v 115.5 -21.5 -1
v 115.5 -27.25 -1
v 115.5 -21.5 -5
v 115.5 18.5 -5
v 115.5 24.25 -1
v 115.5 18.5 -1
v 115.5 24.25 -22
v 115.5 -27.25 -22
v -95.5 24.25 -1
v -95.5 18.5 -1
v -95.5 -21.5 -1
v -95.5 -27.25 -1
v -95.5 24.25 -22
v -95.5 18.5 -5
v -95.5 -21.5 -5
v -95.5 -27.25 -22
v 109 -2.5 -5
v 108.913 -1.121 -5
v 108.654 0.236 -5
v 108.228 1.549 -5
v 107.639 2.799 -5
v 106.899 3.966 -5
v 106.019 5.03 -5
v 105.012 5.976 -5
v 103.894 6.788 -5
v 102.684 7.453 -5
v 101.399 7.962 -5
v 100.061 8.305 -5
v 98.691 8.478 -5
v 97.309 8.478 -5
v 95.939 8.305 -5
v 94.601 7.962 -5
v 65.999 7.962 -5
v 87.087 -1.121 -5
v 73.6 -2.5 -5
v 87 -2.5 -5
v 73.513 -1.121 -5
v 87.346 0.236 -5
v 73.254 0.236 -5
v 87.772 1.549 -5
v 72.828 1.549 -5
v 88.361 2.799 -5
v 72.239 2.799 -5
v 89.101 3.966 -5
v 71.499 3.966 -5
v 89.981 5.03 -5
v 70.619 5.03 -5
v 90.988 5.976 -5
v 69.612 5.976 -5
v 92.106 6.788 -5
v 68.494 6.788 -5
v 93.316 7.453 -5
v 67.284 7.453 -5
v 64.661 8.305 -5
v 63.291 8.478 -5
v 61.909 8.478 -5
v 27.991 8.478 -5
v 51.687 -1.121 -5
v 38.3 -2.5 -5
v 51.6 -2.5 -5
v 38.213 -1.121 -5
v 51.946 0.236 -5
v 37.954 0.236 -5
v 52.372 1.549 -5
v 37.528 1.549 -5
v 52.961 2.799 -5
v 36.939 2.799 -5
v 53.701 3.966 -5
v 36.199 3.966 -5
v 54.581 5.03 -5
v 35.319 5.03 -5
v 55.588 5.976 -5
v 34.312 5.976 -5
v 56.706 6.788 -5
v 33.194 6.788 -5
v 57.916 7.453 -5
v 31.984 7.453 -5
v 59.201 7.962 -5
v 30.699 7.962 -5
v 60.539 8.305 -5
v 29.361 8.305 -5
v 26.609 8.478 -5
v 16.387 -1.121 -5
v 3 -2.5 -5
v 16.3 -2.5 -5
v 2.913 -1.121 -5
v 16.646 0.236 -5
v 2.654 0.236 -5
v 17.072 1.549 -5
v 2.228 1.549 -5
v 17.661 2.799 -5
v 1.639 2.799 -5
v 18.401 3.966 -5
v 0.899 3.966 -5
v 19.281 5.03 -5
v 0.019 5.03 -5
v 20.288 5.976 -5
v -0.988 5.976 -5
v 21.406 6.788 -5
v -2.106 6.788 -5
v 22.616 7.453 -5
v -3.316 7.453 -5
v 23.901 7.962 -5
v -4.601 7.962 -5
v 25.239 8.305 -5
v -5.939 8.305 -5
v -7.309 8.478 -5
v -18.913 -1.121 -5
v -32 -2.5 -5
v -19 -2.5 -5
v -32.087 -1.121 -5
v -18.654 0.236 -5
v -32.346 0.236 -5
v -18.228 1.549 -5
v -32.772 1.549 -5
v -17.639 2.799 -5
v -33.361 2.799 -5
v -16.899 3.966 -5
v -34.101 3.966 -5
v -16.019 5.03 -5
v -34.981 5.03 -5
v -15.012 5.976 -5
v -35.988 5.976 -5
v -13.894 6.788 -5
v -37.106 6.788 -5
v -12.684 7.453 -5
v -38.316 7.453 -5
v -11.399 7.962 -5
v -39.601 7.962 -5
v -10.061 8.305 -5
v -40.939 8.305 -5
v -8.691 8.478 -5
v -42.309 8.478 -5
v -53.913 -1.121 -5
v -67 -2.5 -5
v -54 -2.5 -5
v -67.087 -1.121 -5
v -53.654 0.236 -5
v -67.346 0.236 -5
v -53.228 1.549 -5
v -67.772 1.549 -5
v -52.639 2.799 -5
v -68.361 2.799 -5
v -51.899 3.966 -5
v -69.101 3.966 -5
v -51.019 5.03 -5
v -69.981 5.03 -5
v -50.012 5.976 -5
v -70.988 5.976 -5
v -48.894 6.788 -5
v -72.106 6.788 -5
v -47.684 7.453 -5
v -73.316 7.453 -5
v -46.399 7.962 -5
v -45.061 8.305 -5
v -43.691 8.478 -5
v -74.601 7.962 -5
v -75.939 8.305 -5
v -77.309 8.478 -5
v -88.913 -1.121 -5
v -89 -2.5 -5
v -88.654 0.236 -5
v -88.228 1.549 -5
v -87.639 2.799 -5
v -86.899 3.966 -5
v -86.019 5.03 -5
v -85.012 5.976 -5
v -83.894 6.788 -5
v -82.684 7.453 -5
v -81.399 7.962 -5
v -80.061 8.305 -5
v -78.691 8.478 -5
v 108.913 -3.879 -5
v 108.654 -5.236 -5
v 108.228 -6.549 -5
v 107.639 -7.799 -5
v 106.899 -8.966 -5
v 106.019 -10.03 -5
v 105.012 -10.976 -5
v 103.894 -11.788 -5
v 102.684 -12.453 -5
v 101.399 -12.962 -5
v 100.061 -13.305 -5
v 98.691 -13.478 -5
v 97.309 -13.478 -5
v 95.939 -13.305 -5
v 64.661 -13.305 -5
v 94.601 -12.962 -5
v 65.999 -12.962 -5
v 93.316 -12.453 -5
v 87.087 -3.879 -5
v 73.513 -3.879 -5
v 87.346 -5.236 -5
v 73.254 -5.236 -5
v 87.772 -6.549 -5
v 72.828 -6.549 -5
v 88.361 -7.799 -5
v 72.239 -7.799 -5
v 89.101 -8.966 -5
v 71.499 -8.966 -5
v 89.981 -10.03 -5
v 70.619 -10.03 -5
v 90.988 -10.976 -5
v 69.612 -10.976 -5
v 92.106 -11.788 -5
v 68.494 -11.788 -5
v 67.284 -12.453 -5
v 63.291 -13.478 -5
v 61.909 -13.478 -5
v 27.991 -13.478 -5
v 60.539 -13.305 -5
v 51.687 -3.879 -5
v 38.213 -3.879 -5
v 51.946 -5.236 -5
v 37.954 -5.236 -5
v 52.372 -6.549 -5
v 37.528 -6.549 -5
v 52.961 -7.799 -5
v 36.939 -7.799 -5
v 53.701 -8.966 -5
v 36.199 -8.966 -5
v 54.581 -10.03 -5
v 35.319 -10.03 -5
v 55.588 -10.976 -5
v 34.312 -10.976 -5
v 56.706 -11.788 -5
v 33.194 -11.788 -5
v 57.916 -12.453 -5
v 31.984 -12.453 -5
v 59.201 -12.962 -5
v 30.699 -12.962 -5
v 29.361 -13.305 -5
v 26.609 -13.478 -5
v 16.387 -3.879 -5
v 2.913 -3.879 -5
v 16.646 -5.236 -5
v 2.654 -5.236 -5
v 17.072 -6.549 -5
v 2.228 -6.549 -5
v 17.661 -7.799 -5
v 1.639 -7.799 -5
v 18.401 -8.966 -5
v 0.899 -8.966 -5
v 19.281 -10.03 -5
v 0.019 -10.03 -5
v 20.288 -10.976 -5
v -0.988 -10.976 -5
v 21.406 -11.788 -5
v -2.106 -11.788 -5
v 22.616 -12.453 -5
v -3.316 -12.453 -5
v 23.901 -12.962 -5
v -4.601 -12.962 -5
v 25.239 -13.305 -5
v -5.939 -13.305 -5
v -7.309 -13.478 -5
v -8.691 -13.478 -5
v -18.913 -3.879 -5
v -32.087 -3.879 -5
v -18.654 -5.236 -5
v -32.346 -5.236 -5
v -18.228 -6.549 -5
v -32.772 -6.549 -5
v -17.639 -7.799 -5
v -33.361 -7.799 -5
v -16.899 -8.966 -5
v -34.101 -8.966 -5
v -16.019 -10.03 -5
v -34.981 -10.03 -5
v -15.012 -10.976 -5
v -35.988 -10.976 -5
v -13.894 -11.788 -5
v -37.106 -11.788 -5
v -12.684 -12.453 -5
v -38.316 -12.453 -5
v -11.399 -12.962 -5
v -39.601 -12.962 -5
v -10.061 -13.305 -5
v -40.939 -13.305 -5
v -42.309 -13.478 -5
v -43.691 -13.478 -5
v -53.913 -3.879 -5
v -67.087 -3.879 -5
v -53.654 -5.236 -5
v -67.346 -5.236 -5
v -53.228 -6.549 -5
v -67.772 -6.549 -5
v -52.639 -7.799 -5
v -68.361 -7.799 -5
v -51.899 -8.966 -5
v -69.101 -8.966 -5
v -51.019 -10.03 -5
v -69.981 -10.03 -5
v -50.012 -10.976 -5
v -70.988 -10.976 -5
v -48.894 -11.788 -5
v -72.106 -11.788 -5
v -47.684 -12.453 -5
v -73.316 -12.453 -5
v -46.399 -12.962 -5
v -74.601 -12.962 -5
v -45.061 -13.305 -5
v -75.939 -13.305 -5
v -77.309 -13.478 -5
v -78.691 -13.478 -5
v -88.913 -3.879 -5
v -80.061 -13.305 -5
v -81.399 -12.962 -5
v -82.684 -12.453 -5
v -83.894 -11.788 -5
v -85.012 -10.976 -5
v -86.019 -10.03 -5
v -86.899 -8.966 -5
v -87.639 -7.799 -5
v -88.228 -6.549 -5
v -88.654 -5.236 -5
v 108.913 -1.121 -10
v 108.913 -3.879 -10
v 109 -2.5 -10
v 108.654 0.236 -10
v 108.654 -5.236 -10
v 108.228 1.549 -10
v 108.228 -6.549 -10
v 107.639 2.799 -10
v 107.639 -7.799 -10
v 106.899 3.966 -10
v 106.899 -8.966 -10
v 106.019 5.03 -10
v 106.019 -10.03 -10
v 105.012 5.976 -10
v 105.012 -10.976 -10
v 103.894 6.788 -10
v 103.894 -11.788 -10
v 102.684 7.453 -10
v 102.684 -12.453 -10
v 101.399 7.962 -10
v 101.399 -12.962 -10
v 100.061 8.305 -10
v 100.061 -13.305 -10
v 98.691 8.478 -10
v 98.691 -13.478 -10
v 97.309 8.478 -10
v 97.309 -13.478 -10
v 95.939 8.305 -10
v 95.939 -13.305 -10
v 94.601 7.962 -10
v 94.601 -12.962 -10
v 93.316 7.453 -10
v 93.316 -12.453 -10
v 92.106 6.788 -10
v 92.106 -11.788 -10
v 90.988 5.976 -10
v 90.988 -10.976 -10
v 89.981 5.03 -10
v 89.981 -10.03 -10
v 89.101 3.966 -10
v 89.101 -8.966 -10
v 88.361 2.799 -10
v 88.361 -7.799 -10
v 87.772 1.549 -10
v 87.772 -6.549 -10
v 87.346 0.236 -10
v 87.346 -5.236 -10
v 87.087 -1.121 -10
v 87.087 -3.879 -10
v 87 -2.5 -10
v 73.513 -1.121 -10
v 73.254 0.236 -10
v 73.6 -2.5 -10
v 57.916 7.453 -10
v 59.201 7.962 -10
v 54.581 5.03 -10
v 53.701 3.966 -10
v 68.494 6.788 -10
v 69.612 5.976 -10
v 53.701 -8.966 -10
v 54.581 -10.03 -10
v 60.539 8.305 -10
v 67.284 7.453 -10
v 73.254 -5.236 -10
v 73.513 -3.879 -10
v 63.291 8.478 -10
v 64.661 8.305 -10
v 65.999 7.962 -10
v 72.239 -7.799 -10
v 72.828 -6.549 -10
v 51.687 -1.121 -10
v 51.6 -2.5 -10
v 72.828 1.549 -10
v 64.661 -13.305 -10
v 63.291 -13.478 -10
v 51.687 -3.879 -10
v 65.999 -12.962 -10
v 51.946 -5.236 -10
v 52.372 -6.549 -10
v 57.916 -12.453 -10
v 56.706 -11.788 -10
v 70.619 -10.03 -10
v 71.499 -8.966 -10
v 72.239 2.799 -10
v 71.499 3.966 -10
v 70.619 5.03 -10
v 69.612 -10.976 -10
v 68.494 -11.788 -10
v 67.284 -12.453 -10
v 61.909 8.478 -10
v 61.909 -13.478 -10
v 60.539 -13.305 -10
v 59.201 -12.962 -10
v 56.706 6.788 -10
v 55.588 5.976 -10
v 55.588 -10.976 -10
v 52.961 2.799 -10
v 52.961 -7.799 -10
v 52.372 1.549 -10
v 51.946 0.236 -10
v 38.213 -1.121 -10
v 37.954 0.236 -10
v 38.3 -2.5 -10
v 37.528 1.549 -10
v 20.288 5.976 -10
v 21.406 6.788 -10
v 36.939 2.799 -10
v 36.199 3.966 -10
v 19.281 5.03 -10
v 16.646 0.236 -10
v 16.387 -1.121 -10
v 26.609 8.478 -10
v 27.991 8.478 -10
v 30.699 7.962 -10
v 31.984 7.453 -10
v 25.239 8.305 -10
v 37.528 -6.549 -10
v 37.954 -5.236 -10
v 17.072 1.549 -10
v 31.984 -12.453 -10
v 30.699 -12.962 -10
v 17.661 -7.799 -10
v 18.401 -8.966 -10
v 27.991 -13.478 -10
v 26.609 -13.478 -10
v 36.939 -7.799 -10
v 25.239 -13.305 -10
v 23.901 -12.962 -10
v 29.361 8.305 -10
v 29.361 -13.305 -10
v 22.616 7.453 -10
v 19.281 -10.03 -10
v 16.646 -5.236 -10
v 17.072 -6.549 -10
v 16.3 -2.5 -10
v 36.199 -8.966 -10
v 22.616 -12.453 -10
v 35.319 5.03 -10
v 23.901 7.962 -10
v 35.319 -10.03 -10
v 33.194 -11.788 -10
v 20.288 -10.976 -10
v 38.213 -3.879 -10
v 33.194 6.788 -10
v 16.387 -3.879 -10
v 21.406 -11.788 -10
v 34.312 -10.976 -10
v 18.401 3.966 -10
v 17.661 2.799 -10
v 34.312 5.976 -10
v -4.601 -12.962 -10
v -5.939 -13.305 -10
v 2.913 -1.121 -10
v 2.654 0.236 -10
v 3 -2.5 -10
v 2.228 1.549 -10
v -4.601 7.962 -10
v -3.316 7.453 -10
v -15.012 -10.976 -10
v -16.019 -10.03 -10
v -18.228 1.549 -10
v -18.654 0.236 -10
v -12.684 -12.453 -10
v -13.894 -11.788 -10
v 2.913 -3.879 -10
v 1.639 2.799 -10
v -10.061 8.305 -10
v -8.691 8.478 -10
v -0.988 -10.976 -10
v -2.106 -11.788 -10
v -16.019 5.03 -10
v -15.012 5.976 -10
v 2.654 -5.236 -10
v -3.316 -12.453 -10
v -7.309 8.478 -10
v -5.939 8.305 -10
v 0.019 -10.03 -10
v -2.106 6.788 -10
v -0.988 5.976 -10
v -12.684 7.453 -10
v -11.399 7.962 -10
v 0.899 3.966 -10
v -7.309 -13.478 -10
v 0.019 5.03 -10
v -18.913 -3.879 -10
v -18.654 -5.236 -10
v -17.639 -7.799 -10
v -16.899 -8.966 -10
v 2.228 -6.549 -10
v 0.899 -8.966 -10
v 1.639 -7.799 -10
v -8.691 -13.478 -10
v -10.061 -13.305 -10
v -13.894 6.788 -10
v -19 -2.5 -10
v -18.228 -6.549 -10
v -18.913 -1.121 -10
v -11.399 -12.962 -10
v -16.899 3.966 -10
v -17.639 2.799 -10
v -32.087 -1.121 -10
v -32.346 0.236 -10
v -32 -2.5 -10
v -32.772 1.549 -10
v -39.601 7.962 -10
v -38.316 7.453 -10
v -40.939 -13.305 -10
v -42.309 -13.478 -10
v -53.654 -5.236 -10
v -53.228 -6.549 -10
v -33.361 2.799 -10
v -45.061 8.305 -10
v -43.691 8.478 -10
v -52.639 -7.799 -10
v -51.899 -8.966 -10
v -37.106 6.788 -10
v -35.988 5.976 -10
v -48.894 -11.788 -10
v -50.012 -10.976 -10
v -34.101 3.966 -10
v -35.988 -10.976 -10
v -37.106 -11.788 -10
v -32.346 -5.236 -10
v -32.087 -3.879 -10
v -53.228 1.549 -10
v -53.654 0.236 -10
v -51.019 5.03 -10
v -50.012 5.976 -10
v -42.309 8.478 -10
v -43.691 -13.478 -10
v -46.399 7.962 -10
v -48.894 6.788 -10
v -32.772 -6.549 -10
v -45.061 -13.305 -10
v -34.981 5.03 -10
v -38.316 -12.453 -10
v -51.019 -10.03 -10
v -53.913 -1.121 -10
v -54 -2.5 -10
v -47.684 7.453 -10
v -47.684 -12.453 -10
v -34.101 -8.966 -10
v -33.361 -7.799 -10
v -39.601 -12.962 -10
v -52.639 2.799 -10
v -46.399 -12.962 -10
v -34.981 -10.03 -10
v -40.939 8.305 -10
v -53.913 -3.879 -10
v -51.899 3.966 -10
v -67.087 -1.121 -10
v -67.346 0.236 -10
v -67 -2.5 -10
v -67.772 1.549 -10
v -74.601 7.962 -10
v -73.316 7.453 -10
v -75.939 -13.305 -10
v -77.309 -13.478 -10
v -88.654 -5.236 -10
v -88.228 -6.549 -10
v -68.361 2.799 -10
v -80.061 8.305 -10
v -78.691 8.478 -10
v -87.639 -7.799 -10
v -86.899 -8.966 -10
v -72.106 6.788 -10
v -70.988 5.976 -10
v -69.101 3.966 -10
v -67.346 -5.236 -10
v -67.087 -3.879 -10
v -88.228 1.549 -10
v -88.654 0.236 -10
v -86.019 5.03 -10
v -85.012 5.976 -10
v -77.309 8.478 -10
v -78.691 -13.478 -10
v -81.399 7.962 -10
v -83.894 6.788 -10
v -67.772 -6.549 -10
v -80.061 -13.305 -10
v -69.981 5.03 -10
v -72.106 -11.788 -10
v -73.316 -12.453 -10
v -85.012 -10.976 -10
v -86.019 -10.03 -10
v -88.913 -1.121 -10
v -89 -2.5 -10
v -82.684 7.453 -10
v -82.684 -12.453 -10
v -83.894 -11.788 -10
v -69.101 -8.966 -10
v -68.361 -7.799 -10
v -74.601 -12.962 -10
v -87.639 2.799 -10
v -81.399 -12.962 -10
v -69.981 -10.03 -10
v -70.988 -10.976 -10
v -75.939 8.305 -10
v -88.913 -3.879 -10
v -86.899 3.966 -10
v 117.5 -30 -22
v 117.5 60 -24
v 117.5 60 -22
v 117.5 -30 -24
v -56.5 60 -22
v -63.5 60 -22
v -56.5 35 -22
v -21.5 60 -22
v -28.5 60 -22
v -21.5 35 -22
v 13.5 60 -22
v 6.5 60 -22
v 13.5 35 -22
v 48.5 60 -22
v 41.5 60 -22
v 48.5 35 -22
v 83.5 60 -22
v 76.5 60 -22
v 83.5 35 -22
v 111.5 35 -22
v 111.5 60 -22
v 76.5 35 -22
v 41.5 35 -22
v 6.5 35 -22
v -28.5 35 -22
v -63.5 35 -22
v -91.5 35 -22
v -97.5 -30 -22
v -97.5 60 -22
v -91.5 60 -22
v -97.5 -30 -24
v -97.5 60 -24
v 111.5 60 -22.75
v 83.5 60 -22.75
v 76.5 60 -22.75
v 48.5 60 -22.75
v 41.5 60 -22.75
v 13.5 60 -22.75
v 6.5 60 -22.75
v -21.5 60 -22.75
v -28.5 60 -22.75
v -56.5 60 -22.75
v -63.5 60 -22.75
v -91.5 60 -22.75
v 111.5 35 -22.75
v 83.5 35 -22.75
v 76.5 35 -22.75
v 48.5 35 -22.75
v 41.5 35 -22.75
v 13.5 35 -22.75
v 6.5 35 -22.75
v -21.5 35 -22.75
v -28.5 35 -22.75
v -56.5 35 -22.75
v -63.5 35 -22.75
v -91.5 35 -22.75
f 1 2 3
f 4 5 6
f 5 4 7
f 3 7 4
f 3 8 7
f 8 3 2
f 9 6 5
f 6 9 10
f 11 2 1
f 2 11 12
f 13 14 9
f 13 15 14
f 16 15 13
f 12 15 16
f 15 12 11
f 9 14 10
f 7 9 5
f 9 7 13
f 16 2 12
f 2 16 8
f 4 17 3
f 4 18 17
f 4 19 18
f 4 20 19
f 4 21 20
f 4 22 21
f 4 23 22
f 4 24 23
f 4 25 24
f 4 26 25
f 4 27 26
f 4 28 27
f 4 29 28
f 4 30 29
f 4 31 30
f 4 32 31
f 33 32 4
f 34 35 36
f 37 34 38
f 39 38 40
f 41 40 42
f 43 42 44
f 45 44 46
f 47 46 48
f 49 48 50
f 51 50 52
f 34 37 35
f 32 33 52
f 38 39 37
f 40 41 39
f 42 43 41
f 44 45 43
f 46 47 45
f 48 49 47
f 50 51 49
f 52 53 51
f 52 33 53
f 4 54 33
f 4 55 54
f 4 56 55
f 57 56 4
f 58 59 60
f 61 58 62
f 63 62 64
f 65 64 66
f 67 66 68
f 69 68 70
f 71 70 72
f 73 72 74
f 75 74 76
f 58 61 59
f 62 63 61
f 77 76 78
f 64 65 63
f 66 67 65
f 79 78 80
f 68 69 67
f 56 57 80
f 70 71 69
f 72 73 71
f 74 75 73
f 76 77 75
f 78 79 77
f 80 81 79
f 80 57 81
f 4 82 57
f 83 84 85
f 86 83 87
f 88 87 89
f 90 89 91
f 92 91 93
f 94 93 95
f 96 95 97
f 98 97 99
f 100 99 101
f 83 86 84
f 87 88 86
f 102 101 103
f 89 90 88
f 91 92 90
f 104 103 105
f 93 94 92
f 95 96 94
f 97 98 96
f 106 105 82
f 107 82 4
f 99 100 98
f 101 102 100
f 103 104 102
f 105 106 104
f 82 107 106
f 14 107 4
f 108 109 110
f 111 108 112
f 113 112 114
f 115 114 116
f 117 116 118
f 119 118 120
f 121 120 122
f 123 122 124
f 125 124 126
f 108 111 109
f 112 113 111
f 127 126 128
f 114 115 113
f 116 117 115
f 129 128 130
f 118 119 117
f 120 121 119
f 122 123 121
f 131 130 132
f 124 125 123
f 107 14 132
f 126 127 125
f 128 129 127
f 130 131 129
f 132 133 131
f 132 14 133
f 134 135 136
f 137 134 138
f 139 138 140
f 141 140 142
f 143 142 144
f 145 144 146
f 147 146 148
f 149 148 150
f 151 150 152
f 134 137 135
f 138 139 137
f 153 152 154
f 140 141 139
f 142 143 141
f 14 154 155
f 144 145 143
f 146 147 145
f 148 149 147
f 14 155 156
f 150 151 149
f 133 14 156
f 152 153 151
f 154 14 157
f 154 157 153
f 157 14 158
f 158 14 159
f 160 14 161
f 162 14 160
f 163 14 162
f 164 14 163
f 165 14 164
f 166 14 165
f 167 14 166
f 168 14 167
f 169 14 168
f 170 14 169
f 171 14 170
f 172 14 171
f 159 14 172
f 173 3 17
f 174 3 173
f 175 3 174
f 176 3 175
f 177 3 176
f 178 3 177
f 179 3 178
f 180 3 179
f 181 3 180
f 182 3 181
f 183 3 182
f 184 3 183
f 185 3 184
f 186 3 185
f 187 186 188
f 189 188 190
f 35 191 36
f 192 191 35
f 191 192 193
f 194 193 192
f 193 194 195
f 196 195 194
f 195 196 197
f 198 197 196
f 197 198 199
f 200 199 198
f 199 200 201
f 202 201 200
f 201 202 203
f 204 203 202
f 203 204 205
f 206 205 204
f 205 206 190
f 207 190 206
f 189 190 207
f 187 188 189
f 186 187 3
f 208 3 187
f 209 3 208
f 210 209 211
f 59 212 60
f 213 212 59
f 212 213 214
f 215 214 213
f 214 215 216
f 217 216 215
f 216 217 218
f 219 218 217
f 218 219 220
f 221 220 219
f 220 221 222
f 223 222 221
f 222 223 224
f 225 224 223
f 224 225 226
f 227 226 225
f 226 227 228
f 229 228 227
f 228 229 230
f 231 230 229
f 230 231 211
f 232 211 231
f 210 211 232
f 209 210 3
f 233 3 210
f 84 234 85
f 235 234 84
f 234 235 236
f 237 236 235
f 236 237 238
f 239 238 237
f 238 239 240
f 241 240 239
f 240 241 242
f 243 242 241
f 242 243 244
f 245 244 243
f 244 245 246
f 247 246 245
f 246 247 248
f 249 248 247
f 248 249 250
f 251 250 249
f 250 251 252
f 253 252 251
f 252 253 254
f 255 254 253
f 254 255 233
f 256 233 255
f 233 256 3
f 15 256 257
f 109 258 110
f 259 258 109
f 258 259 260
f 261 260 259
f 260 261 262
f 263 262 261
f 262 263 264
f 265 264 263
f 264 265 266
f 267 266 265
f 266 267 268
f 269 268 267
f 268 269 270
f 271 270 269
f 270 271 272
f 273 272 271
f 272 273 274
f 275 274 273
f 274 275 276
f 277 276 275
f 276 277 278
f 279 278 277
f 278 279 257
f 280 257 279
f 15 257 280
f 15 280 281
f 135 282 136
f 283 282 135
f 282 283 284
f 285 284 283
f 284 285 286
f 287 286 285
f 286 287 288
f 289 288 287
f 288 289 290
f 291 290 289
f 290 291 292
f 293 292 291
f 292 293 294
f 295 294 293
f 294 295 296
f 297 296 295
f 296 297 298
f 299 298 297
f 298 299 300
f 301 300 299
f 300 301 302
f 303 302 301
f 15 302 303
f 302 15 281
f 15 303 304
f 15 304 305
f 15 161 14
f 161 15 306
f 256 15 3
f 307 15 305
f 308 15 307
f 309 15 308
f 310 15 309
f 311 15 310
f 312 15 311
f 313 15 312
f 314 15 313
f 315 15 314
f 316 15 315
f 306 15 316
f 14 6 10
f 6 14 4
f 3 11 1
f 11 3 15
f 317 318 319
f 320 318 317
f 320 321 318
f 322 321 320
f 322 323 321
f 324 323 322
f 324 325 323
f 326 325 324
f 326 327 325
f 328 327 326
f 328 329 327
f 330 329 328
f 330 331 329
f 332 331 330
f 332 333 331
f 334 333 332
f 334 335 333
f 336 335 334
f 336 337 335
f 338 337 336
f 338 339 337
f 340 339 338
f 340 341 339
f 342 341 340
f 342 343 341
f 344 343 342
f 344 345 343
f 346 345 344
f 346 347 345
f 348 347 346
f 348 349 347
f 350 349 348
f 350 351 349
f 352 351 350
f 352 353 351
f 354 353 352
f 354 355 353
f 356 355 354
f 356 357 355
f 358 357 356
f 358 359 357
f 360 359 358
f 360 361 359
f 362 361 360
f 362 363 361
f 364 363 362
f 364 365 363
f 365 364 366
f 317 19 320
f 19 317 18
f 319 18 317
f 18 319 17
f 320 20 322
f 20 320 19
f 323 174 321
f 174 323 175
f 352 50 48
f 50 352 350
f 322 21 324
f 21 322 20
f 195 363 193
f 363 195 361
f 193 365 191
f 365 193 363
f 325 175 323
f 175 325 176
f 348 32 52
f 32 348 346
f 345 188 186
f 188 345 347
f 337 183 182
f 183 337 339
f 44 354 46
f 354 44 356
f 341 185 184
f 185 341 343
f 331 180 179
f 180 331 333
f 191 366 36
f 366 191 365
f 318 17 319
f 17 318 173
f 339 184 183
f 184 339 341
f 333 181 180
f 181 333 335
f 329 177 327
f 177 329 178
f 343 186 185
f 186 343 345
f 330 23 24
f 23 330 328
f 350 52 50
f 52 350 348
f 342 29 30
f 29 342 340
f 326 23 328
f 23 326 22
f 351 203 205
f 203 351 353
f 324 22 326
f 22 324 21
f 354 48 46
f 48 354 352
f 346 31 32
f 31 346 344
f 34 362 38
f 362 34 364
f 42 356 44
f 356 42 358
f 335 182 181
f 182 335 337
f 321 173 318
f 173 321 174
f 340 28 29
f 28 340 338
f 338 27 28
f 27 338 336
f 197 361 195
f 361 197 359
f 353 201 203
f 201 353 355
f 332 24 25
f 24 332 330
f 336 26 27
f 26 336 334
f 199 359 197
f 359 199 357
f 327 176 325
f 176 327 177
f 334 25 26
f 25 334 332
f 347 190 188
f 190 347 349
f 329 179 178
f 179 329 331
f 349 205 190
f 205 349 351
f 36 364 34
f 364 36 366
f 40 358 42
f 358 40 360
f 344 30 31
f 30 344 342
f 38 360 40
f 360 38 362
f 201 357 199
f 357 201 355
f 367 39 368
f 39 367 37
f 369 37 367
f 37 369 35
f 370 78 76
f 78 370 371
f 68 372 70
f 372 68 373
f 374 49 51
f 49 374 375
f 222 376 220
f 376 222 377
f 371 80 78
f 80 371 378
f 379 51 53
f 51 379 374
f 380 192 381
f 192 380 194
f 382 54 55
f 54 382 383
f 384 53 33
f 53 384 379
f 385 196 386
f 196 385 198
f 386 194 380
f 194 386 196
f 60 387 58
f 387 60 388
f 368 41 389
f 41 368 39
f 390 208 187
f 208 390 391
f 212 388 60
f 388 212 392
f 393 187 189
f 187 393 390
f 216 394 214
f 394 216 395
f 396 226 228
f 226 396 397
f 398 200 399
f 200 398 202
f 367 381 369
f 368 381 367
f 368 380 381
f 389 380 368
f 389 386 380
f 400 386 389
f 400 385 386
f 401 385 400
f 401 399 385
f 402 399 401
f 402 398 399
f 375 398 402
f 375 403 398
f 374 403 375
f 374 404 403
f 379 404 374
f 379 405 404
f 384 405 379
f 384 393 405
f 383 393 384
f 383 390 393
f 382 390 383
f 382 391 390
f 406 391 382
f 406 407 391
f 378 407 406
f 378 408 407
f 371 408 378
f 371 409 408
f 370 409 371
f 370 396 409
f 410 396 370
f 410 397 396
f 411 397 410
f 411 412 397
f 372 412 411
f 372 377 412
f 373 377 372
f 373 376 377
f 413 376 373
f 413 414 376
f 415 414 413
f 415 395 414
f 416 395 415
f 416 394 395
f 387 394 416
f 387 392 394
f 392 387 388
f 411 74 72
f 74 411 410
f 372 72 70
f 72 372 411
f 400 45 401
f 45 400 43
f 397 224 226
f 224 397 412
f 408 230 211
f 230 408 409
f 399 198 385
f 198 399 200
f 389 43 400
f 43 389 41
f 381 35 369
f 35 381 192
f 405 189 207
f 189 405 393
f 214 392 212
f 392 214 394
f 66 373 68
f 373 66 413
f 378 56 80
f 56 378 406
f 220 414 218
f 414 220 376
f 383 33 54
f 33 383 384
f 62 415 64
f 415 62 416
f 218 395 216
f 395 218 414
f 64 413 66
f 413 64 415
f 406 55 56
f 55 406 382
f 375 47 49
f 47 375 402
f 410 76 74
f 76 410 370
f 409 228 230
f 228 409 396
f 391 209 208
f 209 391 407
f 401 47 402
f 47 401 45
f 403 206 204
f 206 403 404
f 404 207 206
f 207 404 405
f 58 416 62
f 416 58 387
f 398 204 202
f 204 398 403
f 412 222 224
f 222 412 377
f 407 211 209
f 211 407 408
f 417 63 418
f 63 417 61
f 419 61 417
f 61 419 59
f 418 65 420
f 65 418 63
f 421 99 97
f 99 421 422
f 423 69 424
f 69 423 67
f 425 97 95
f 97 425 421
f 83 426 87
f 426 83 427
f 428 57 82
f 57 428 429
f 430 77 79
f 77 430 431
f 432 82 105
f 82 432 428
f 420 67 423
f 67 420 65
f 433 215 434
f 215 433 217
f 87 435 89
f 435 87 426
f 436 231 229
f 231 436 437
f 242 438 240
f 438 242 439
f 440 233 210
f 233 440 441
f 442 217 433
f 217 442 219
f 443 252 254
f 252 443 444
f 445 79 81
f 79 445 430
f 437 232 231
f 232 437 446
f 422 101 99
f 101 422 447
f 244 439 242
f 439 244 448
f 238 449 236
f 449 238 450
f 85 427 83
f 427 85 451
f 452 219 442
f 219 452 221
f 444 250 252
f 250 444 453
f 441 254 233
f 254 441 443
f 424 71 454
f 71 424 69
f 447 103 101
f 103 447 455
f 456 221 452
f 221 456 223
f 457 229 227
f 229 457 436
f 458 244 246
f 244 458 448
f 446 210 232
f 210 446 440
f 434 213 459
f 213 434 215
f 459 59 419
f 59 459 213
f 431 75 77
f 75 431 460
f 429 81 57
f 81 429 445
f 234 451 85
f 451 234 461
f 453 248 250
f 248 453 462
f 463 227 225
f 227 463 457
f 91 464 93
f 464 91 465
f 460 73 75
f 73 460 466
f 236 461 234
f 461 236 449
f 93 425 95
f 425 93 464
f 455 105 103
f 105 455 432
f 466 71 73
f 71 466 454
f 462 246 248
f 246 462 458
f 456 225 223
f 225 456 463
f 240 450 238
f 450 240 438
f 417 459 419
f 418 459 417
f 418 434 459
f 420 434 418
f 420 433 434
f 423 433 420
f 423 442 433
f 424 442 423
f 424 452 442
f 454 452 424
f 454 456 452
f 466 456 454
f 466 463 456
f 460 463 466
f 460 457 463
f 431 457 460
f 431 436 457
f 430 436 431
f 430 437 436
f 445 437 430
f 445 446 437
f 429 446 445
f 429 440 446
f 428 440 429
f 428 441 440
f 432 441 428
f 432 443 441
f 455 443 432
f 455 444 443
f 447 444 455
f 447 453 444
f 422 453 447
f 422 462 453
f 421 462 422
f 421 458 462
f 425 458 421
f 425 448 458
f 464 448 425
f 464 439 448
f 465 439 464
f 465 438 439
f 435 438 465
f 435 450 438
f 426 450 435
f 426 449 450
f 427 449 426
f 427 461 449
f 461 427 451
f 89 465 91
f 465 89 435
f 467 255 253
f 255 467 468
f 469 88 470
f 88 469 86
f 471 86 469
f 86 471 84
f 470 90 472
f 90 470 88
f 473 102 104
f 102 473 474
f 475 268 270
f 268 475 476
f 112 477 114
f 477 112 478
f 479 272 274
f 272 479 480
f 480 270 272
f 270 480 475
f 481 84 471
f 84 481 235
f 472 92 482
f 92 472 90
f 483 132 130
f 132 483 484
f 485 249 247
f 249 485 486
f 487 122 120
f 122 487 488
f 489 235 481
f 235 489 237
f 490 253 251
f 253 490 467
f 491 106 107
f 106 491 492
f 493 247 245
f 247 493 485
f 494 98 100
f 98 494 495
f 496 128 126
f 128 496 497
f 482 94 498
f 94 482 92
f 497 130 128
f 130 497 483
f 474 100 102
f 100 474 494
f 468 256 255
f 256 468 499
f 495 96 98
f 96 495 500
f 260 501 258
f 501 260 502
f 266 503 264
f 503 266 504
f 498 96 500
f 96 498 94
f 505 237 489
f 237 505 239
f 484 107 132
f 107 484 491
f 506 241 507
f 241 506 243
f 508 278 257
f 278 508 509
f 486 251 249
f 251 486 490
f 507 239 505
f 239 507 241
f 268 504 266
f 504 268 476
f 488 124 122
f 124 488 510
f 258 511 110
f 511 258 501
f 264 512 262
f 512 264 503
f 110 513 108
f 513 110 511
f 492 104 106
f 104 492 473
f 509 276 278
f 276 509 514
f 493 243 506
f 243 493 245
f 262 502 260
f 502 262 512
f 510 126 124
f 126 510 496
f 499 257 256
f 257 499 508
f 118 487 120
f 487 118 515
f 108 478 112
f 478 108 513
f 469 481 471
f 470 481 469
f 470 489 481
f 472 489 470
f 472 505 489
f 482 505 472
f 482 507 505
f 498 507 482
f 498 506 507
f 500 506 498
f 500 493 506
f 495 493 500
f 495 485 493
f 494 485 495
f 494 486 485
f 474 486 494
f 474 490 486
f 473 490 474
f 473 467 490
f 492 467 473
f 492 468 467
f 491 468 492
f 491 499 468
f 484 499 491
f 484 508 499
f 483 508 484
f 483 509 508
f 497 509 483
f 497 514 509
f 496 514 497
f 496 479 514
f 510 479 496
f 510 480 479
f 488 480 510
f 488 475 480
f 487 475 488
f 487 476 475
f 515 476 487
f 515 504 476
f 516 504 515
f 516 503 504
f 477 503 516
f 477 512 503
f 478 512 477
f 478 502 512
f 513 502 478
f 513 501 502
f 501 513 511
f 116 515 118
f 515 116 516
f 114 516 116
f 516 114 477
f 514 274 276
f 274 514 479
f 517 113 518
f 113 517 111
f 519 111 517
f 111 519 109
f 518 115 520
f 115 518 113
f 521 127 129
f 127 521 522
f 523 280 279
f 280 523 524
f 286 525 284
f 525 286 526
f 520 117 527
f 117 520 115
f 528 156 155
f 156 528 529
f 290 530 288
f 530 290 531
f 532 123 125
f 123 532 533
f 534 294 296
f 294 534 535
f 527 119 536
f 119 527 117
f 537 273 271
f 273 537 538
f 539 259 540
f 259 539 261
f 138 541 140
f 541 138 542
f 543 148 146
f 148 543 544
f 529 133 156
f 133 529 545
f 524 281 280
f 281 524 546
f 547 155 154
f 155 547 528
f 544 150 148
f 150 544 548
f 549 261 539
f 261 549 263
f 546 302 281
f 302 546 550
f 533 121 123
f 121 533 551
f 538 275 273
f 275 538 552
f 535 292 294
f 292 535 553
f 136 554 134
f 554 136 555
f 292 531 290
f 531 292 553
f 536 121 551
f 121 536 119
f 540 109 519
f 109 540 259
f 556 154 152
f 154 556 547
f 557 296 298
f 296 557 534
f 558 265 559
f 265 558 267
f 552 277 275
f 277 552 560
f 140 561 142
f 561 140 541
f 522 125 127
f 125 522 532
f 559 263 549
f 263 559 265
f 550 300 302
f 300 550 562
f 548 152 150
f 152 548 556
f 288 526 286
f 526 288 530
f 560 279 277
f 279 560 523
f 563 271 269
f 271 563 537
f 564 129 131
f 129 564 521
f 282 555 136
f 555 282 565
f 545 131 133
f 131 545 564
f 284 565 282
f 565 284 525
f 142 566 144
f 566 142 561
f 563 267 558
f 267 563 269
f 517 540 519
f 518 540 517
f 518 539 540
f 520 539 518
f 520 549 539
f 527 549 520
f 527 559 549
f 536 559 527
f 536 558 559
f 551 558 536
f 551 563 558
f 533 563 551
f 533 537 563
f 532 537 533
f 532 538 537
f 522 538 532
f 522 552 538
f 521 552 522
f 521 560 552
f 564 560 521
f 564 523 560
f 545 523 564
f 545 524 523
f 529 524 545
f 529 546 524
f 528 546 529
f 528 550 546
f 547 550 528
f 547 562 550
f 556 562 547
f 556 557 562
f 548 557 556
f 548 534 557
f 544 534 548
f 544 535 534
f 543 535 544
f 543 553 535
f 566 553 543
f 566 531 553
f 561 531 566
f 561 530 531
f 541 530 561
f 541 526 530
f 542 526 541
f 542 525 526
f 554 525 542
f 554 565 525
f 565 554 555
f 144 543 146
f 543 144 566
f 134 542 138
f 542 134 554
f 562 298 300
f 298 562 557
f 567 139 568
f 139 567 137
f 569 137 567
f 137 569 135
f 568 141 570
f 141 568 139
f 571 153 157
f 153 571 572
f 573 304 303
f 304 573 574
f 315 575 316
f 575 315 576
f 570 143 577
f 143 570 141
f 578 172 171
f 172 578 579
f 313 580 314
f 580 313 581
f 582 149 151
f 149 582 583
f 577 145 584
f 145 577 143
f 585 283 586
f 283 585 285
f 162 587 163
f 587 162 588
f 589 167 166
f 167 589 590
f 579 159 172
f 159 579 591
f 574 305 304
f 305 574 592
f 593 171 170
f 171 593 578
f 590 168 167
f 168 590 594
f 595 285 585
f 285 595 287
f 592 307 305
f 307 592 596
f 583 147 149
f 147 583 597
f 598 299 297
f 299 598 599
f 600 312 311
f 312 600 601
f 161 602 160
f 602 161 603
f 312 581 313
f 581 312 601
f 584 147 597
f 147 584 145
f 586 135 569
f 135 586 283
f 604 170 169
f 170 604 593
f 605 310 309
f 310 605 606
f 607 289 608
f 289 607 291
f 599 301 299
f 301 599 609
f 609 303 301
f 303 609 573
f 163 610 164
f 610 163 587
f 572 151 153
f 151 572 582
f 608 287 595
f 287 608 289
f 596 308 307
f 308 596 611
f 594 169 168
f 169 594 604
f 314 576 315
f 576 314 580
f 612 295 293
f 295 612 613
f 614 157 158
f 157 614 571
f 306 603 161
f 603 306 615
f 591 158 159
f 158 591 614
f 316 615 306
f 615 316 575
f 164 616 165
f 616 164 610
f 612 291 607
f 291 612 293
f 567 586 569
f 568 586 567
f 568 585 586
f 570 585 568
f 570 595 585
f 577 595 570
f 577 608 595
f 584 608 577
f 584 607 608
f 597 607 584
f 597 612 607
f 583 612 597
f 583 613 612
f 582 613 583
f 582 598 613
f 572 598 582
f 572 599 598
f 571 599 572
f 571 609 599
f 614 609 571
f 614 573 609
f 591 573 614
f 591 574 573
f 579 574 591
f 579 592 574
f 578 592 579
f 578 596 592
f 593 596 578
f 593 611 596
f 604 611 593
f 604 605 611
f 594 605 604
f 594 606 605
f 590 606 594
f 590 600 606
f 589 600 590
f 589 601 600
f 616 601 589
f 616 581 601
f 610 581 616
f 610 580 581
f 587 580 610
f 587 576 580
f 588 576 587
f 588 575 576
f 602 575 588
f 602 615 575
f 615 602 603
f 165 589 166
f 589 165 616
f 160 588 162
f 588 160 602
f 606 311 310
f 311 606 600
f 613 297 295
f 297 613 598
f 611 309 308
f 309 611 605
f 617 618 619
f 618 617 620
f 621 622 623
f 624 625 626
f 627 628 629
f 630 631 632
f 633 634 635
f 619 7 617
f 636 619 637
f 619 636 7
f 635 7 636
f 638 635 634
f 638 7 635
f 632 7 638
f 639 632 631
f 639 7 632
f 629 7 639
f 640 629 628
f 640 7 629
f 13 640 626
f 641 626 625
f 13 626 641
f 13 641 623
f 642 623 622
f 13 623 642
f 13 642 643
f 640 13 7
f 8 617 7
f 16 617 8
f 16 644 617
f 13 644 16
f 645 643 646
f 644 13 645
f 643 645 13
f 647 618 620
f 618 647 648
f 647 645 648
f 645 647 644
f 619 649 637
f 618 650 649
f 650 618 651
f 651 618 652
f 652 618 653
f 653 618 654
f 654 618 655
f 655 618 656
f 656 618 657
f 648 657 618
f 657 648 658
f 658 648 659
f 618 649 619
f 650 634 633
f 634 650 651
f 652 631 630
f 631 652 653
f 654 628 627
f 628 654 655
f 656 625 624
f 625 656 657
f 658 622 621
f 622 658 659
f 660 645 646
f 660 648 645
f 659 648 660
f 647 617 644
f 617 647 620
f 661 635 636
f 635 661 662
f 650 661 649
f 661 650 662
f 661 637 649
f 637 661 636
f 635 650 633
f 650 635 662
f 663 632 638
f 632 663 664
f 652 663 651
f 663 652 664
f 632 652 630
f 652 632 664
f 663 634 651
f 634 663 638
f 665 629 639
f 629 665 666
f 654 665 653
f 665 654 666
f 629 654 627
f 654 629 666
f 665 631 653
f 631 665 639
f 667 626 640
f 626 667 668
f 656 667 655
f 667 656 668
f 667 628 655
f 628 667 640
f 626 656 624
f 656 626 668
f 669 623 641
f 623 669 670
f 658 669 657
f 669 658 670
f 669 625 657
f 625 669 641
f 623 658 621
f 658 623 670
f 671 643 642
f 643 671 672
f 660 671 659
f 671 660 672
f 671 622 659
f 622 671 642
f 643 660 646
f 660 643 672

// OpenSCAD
// file: modules.scad
offset = [0,8,0];
zoom = [0.8,0.8,1];

module white( filename, text)
{
    translate([0,4,0])   scale(zoom)
    rotate([180,0,-90]) 
    union(){ 
        translate([-14,-6.4,-2.5])   rotate([0,0,90])  linear_extrude(5)  text (text,font="bold",size=3); 
        intersection() 
        {    
            cube([35,35,5],center=true); 
            translate([1.5,0,2.6])   scale([0.14,0.14,-1])surface(file = filename, center = true); 
        } 
    } 

};

module black( filename, text)
{
    translate([0,4,0])   scale(zoom)
    rotate([180,0,-90]) 
    difference() 
    {    
        cube([35,35,5],center=true); 
        translate([1.5,0,2.6])    scale([0.14,0.14,-1]) surface(file = filename, center = true);
        translate([-14,-6.4,-2.5])   rotate([0,0,90])  linear_extrude(6)  text (text,font="bold",size=3);
    } 
}

module shape()
{
    translate([0,8,0])   scale(zoom) rotate([180,0,0]) 
    {
        rotate([0,0,90]) translate([5,0,0])  cube([35,35,5.5],center=true);  
        // use for help
//        linear_extrude(5)  translate([-9,-4,0])   text("B",size=20);
    }
}

module cube_appendix()
{
    difference()
    {
        union()
        {
            translate([0,0,1])
            {
                cube([35,35,35],center=true);
                 translate([0,0,7]) cylinder(r=10,h=30,center=true);
            }
        }
        translate([0,0,-24]) cylinder(r=10,h=30,center=true);
    }
}

module blue_stairs()
{
        union()
        {
            translate([0,0,1])cube([35,35,35],center=true);
            translate([0,0,-20.5])cube([35,35,9],center=true);            
            translate([-4.25,0,-29.5])cube([35-8.5,35,9],center=true);            
            translate([-8.5,0,-29.5-9])cube([35-17,35,9],center=true);            
            translate([-13,0,-29.5-17.5])cube([35-26,35,9],center=true);            

        }
}

module green_stairs()
{
        union()
        {
            translate([0,0,1+35/2])cube([35,35,70],center=true);
            translate([0,0,-20.5])cube([35,35,9],center=true);            
            translate([-4.25,0,-29.5])cube([35-8.5,35,9],center=true);            
            translate([-8.5,0,-29.5-9])cube([35-17,35,9],center=true);            
            translate([-13,0,-29.5-17.5])cube([35-26,35,9],center=true);            

        }
}

module support()
{
    difference()
    {
        translate([10,-1.5,-12])
        {
            difference()
            {
                cube([211,51.5,22],center=true);
                translate([0,0,17]) cube([211,40,20],center=true);
                
                
            }
        }
        translate([106-8,-2.5,-10])    cylinder(r=11,h=10,$fn=50);
        translate([70.6-8,-2.5,-10])    cylinder(r=11,h=10,$fn=50);
        translate([35.3-8,-2.5,-10])    cylinder(r=11,h=10,$fn=50);
        translate([-8,-2.5,-10])    cylinder(r=11,h=10,$fn=50);
        translate([-43,-2.5,-10])    cylinder(r=11,h=10,$fn=50);
        translate([-78,-2.5,-10])    cylinder(r=11,h=10,$fn=50);
    }
}
// main file
include <modules.scad>

offset = 35;
bord = 97.5;

difference()
{
    color([1,0,0])
    {
        union()
        {
            support();
            translate([10,15,-23]) cube([215,90,2],center=true);
        }
    }

    union() color([0,1,0])
    {
        translate([bord,45,-20])              rotate([0,180,0]) shape();    
        translate([bord-offset,45,-20])       rotate([0,180,0]) shape();    
        translate([bord-2*offset,45,-20])     rotate([0,180,0]) shape();    
        translate([bord-3*offset,45,-20])     rotate([0,180,0]) shape();    
        translate([bord-4*offset,45,-20])     rotate([0,180,0]) shape();    
        translate([bord-5*offset,45,-20])     rotate([0,180,0]) shape();    
    }
}
